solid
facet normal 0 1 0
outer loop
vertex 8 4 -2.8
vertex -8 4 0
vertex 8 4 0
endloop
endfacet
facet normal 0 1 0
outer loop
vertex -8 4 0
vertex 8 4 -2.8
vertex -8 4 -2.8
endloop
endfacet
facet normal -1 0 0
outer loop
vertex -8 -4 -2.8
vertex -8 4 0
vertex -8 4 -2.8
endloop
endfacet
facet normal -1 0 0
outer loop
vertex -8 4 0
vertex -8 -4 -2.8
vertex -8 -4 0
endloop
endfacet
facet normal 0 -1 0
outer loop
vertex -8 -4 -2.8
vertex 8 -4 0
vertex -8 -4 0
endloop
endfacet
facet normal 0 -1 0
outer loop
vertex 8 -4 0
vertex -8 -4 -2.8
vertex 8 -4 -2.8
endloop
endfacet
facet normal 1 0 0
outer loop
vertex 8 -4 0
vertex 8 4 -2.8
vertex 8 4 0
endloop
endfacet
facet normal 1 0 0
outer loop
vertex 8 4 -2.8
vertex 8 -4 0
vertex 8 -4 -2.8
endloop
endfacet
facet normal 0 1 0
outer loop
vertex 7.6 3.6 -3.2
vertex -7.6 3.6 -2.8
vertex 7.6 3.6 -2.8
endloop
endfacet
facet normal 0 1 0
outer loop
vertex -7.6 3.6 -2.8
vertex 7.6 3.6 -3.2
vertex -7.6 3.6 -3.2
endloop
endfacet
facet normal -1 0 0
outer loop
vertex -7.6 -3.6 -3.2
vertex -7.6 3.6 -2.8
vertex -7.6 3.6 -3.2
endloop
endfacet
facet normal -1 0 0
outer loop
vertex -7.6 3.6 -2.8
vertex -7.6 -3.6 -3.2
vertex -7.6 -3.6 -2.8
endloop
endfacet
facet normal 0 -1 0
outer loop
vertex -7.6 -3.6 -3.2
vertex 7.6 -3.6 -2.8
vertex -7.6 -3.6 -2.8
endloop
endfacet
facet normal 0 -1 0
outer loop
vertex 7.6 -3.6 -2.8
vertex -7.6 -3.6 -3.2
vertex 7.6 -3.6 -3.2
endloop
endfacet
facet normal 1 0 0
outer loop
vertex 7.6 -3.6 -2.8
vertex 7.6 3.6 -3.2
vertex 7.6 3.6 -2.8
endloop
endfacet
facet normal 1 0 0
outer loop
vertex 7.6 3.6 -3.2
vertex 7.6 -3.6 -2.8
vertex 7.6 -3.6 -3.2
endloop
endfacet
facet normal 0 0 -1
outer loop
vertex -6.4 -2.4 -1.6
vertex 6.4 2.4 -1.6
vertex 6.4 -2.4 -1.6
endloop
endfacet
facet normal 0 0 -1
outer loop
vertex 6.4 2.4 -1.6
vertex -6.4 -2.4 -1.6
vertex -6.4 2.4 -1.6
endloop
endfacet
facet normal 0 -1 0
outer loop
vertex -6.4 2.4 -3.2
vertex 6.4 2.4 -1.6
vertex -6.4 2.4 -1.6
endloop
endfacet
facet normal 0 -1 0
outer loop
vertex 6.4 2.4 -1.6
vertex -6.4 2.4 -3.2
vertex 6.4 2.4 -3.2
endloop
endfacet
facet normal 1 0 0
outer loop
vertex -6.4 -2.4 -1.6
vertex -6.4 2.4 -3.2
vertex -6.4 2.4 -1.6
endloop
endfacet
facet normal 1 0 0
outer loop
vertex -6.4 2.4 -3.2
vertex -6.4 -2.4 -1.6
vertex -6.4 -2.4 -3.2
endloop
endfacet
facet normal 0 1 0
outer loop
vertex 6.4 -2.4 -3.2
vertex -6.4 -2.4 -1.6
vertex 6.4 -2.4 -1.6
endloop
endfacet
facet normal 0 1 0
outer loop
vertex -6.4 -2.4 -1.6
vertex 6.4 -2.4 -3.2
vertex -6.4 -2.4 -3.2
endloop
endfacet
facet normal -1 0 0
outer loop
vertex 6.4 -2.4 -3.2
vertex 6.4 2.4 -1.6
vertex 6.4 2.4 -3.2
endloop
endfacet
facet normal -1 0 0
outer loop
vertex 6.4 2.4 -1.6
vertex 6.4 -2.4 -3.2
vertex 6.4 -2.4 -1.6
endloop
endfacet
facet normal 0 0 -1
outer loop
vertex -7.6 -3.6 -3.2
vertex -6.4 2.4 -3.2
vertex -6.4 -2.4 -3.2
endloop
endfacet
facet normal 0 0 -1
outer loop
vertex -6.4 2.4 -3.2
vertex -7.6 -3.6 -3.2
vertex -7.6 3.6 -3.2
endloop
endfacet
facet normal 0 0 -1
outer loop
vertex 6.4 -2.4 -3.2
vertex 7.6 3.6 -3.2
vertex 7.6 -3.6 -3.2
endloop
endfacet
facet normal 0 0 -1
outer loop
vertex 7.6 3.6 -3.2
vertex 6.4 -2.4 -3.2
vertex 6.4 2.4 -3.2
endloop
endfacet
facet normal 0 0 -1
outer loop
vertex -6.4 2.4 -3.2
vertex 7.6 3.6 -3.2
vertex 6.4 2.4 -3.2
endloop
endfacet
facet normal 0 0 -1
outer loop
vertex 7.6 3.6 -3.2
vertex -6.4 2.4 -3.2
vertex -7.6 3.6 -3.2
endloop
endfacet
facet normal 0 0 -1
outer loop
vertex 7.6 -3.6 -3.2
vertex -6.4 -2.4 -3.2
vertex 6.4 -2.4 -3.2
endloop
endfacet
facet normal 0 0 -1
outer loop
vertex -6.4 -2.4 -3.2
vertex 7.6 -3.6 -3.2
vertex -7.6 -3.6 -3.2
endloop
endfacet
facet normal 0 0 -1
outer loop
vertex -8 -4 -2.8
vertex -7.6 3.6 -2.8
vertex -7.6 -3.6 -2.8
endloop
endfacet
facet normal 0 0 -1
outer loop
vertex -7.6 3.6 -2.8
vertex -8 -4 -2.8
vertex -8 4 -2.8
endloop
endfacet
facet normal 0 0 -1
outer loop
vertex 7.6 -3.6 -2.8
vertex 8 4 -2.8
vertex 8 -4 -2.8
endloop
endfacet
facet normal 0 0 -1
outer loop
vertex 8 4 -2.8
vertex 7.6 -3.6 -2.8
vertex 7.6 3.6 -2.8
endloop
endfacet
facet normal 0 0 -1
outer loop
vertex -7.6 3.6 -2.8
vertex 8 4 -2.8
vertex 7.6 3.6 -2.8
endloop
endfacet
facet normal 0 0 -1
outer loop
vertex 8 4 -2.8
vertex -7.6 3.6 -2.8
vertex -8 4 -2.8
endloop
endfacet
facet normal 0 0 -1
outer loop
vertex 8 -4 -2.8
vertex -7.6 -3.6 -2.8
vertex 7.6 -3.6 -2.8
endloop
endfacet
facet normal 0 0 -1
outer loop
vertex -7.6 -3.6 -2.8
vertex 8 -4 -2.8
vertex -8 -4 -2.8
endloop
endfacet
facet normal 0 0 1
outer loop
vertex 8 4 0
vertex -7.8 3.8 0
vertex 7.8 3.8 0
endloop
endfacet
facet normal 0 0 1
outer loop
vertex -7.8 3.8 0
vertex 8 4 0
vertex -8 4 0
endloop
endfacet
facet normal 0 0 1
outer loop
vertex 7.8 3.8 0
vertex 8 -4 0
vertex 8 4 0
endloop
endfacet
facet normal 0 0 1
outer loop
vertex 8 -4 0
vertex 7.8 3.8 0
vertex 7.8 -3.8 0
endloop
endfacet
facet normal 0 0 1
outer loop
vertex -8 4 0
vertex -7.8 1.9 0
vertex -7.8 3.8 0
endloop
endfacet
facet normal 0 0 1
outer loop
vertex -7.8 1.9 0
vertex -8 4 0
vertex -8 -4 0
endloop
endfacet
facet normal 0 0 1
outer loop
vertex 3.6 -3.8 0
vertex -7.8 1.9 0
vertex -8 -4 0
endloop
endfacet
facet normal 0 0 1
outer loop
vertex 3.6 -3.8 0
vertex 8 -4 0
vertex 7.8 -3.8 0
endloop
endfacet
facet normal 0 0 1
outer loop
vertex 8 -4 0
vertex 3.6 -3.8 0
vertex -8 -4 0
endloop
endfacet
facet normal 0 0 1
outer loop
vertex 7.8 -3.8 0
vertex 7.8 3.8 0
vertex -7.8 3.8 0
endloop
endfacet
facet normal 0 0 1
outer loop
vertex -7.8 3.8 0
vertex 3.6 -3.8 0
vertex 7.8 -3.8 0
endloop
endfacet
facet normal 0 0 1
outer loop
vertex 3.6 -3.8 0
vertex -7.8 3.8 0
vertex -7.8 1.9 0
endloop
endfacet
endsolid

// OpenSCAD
// file: ../p/box5.scad
use <../lib.scad>
function ldraw_lib__box5() = [
// 0 Box with 5 Faces and All Edges
// 0 Name: box5.dat
// 0 Author: James Jessiman
// 0 !LDRAW_ORG Primitive UPDATE 2012-01
// 0 !LICENSE Licensed under CC BY 4.0 : see CAreadme.txt
// 
// 0 BFC CERTIFY CCW
  [0,"BFC","CERTIFY"],
  [0,"BFC","CCW"],
// 
// 0 !HISTORY 2002-04-03 [sbliss] Modified for BFC compliance
// 0 !HISTORY 2002-04-25 [PTadmin] Official Update 2002-02
// 0 !HISTORY 2007-06-24 [PTadmin] Header formatted for Contributor Agreement
// 0 !HISTORY 2008-07-01 [PTadmin] Official Update 2008-01
// 0 !HISTORY 2012-02-16 [Philo] Changed to CCW
// 0 !HISTORY 2012-03-30 [PTadmin] Official Update 2012-01
// 
// 
// 2 24 1 1 1 -1 1 1
  [2,24,1,1,1,-1,1,1],
// 2 24 -1 1 1 -1 1 -1
  [2,24,-1,1,1,-1,1,-1],
// 2 24 -1 1 -1 1 1 -1
  [2,24,-1,1,-1,1,1,-1],
// 2 24 1 1 -1 1 1 1
  [2,24,1,1,-1,1,1,1],
// 2 24 1 0 1 -1 0 1
  [2,24,1,0,1,-1,0,1],
// 2 24 -1 0 1 -1 0 -1
  [2,24,-1,0,1,-1,0,-1],
// 2 24 -1 0 -1 1 0 -1
  [2,24,-1,0,-1,1,0,-1],
// 2 24 1 0 -1 1 0 1
  [2,24,1,0,-1,1,0,1],
// 2 24 1 0 1 1 1 1
  [2,24,1,0,1,1,1,1],
// 2 24 -1 0 1 -1 1 1
  [2,24,-1,0,1,-1,1,1],
// 2 24 1 0 -1 1 1 -1
  [2,24,1,0,-1,1,1,-1],
// 2 24 -1 0 -1 -1 1 -1
  [2,24,-1,0,-1,-1,1,-1],
// 4 16 -1 1 1 1 1 1 1 1 -1 -1 1 -1
  [4,16,-1,1,1,1,1,1,1,1,-1,-1,1,-1],
// 4 16 -1 1 1 -1 0 1 1 0 1 1 1 1
  [4,16,-1,1,1,-1,0,1,1,0,1,1,1,1],
// 4 16 -1 1 -1 -1 0 -1 -1 0 1 -1 1 1
  [4,16,-1,1,-1,-1,0,-1,-1,0,1,-1,1,1],
// 4 16 1 1 -1 1 0 -1 -1 0 -1 -1 1 -1
  [4,16,1,1,-1,1,0,-1,-1,0,-1,-1,1,-1],
// 4 16 1 1 1 1 0 1 1 0 -1 1 1 -1
  [4,16,1,1,1,1,0,1,1,0,-1,1,1,-1],
];
module ldraw_lib__box5(step=0, col=false, unit=2/5, alt=false, line=0.2, solid=!$preview)
    makepoly(ldraw_lib__box5(), step=step, col=col, unit=unit, alt=alt, line=line, solid=solid);
ldraw_lib__box5(line=0.2);
// file: ../p/box4.scad
use <../lib.scad>
function ldraw_lib__box4() = [
// 0 Box with 4 Faces (2 Parallel Pairs) and All Edges
// 0 Name: box4.dat
// 0 Author: James Jessiman
// 0 !LDRAW_ORG Primitive UPDATE 2012-01
// 0 !LICENSE Licensed under CC BY 4.0 : see CAreadme.txt
// 
// 0 BFC CERTIFY CCW
  [0,"BFC","CERTIFY"],
  [0,"BFC","CCW"],
// 
// 0 !HISTORY 2002-04-03 [sbliss] Modified for BFC compliance
// 0 !HISTORY 2002-04-25 [PTadmin] Official Update 2002-02
// 0 !HISTORY 2007-06-24 [PTadmin] Header formatted for Contributor Agreement
// 0 !HISTORY 2008-07-01 [PTadmin] Official Update 2008-01
// 0 !HISTORY 2012-02-16 [Philo] Changed to CCW
// 0 !HISTORY 2012-03-30 [PTadmin] Official Update 2012-01
// 
// 
// 2 24 1 1 1 -1 1 1
  [2,24,1,1,1,-1,1,1],
// 2 24 -1 1 1 -1 1 -1
  [2,24,-1,1,1,-1,1,-1],
// 2 24 -1 1 -1 1 1 -1
  [2,24,-1,1,-1,1,1,-1],
// 2 24 1 1 -1 1 1 1
  [2,24,1,1,-1,1,1,1],
// 2 24 1 0 1 -1 0 1
  [2,24,1,0,1,-1,0,1],
// 2 24 -1 0 1 -1 0 -1
  [2,24,-1,0,1,-1,0,-1],
// 2 24 -1 0 -1 1 0 -1
  [2,24,-1,0,-1,1,0,-1],
// 2 24 1 0 -1 1 0 1
  [2,24,1,0,-1,1,0,1],
// 2 24 1 0 1 1 1 1
  [2,24,1,0,1,1,1,1],
// 2 24 -1 0 1 -1 1 1
  [2,24,-1,0,1,-1,1,1],
// 2 24 1 0 -1 1 1 -1
  [2,24,1,0,-1,1,1,-1],
// 2 24 -1 0 -1 -1 1 -1
  [2,24,-1,0,-1,-1,1,-1],
// 4 16 -1 1 1 -1 0 1 1 0 1 1 1 1
  [4,16,-1,1,1,-1,0,1,1,0,1,1,1,1],
// 4 16 -1 1 -1 -1 0 -1 -1 0 1 -1 1 1
  [4,16,-1,1,-1,-1,0,-1,-1,0,1,-1,1,1],
// 4 16 1 1 -1 1 0 -1 -1 0 -1 -1 1 -1
  [4,16,1,1,-1,1,0,-1,-1,0,-1,-1,1,-1],
// 4 16 1 1 1 1 0 1 1 0 -1 1 1 -1
  [4,16,1,1,1,1,0,1,1,0,-1,1,1,-1],
];
module ldraw_lib__box4(step=0, col=false, unit=2/5, alt=false, line=0.2, solid=!$preview)
    makepoly(ldraw_lib__box4(), step=step, col=col, unit=unit, alt=alt, line=line, solid=solid);
ldraw_lib__box4(line=0.2);
// file: s/3069bs01.scad
use <../../lib.scad>
use <../../p/box4.scad>
use <../../p/box5.scad>
function ldraw_lib__s__3069bs01() = [
// 0 ~Tile  1 x  2 with Groove without Top Face
// 0 Name: s\3069bs01.dat
// 0 Author: Santeri Piippo [arezey]
// 0 !LDRAW_ORG Subpart UPDATE 2010-02
// 0 !LICENSE Licensed under CC BY 4.0 : see CAreadme.txt
// 
// 0 BFC CERTIFY CCW
  [0,"BFC","CERTIFY"],
  [0,"BFC","CCW"],
// 
// 0 !HISTORY 2010-07-05 [PTadmin] Official Update 2010-02
// 
// 
// 1 16 0 0 0 20 0 0 0 7 0 0 0 10 box4.dat
  [1,16,0,0,0,20,0,0,0,7,0,0,0,10, ldraw_lib__box4()],
// 1 16 0 7 0 19 0 0 0 1 0 0 0 9 box4.dat
  [1,16,0,7,0,19,0,0,0,1,0,0,0,9, ldraw_lib__box4()],
// 0 BFC INVERTNEXT
  [0,"BFC","INVERTNEXT"],
// 1 16 0 8 0 16 0 0 0 -4 0 0 0 6 box5.dat
  [1,16,0,8,0,16,0,0,0,-4,0,0,0,6, ldraw_lib__box5()],
// 4 16 -19 8 9 -16 8 6 -16 8 -6 -19 8 -9
  [4,16,-19,8,9,-16,8,6,-16,8,-6,-19,8,-9],
// 4 16 19 8 -9 16 8 -6 16 8 6 19 8 9
  [4,16,19,8,-9,16,8,-6,16,8,6,19,8,9],
// 4 16 19 8 9 16 8 6 -16 8 6 -19 8 9
  [4,16,19,8,9,16,8,6,-16,8,6,-19,8,9],
// 4 16 -19 8 -9 -16 8 -6 16 8 -6 19 8 -9
  [4,16,-19,8,-9,-16,8,-6,16,8,-6,19,8,-9],
// 4 16 -20 7 10 -19 7 9 -19 7 -9 -20 7 -10
  [4,16,-20,7,10,-19,7,9,-19,7,-9,-20,7,-10],
// 4 16 20 7 -10 19 7 -9 19 7 9 20 7 10
  [4,16,20,7,-10,19,7,-9,19,7,9,20,7,10],
// 4 16 20 7 10 19 7 9 -19 7 9 -20 7 10
  [4,16,20,7,10,19,7,9,-19,7,9,-20,7,10],
// 4 16 -20 7 -10 -19 7 -9 19 7 -9 20 7 -10
  [4,16,-20,7,-10,-19,7,-9,19,7,-9,20,7,-10],
// 0 //
];
module ldraw_lib__s__3069bs01(step=0, col=false, unit=2/5, alt=false, line=0.2, solid=!$preview)
    makepoly(ldraw_lib__s__3069bs01(), step=step, col=col, unit=unit, alt=alt, line=line, solid=solid);
ldraw_lib__s__3069bs01(line=0.2);
// file: s/3069bphs01.scad
use <../../lib.scad>
function ldraw_lib__s__3069bphs01() = [
// 0 ~Tile  1 x  2 with Black Top without Lower-Left Corner Pattern - Top Surface
// 0 Name: s\3069bphs01.dat
// 0 Author: Massimo Maso [Sirio]
// 0 !LDRAW_ORG Subpart UPDATE 2017-01
// 0 !LICENSE Licensed under CC BY 4.0 : see CAreadme.txt
// 
// 0 BFC CERTIFY CW
  [0,"BFC","CERTIFY"],
  [0,"BFC","CW"],
// 
// 0 !HISTORY 2017-12-30 [PTadmin] Official Update 2017-01
// 
// 
// 0 // Uncolored surface
// 4 16 -19.5 0 9.5 -20 0 10 20 0 10 19.5 0 9.5
  [4,16,-19.5,0,9.5,-20,0,10,20,0,10,19.5,0,9.5],
// 4 16 19.5 0 -9.5 19.5 0 9.5 20 0 10 20 0 -10
  [4,16,19.5,0,-9.5,19.5,0,9.5,20,0,10,20,0,-10],
// 4 16 -20 0 -10 -20 0 10 -19.5 0 9.5 -19.5 0 4.75
  [4,16,-20,0,-10,-20,0,10,-19.5,0,9.5,-19.5,0,4.75],
// 3 16 -20 0 -10 -19.5 0 4.75 9 0 -9.5
  [3,16,-20,0,-10,-19.5,0,4.75,9,0,-9.5],
// 4 16 -20 0 -10 9 0 -9.5 19.5 0 -9.5 20 0 -10
  [4,16,-20,0,-10,9,0,-9.5,19.5,0,-9.5,20,0,-10],
// 0 // Black surface
// 3 0 -19.5 0 9.5 19.5 0 9.5 19.5 0 -9.5
  [3,0,-19.5,0,9.5,19.5,0,9.5,19.5,0,-9.5],
// 4 0 -19.5 0 9.5 19.5 0 -9.5 9 0 -9.5 -19.5 0 4.75
  [4,0,-19.5,0,9.5,19.5,0,-9.5,9,0,-9.5,-19.5,0,4.75],
];
module ldraw_lib__s__3069bphs01(step=0, col=false, unit=2/5, alt=false, line=0.2, solid=!$preview)
    makepoly(ldraw_lib__s__3069bphs01(), step=step, col=col, unit=unit, alt=alt, line=line, solid=solid);
ldraw_lib__s__3069bphs01(line=0.2);
// main file
use <../lib.scad>
use <s/3069bphs01.scad>
use <s/3069bs01.scad>
function ldraw_lib__3069bph() = [
// 0 Tile  1 x  2 with Black Top without Lower-Left Corner Pattern
// 0 Name: 3069bph.dat
// 0 Author: Massimo Maso [Sirio]
// 0 !LDRAW_ORG Part UPDATE 2017-01
// 0 !LICENSE Licensed under CC BY 4.0 : see CAreadme.txt
// 
// 0 BFC CERTIFY CCW
  [0,"BFC","CERTIFY"],
  [0,"BFC","CCW"],
// 
// 0 !KEYWORDS BrickLink 3069pb0461R, Rebrickable 3069bpr0165
// 
// 0 !HISTORY 2017-12-30 [PTadmin] Official Update 2017-01
// 
// 
// 1 16 0 0 0 1 0 0 0 1 0 0 0 1 s\3069bs01.dat
  [1,16,0,0,0,1,0,0,0,1,0,0,0,1, ldraw_lib__s__3069bs01()],
// 1 16 0 0 0 1 0 0 0 1 0 0 0 1 s\3069bphs01.dat
  [1,16,0,0,0,1,0,0,0,1,0,0,0,1, ldraw_lib__s__3069bphs01()],
];
module ldraw_lib__3069bph(step=0, col=false, unit=2/5, alt=false, line=0.2, solid=!$preview)
    makepoly(ldraw_lib__3069bph(), step=step, col=col, unit=unit, alt=alt, line=line, solid=solid);
ldraw_lib__3069bph(line=0.2);
